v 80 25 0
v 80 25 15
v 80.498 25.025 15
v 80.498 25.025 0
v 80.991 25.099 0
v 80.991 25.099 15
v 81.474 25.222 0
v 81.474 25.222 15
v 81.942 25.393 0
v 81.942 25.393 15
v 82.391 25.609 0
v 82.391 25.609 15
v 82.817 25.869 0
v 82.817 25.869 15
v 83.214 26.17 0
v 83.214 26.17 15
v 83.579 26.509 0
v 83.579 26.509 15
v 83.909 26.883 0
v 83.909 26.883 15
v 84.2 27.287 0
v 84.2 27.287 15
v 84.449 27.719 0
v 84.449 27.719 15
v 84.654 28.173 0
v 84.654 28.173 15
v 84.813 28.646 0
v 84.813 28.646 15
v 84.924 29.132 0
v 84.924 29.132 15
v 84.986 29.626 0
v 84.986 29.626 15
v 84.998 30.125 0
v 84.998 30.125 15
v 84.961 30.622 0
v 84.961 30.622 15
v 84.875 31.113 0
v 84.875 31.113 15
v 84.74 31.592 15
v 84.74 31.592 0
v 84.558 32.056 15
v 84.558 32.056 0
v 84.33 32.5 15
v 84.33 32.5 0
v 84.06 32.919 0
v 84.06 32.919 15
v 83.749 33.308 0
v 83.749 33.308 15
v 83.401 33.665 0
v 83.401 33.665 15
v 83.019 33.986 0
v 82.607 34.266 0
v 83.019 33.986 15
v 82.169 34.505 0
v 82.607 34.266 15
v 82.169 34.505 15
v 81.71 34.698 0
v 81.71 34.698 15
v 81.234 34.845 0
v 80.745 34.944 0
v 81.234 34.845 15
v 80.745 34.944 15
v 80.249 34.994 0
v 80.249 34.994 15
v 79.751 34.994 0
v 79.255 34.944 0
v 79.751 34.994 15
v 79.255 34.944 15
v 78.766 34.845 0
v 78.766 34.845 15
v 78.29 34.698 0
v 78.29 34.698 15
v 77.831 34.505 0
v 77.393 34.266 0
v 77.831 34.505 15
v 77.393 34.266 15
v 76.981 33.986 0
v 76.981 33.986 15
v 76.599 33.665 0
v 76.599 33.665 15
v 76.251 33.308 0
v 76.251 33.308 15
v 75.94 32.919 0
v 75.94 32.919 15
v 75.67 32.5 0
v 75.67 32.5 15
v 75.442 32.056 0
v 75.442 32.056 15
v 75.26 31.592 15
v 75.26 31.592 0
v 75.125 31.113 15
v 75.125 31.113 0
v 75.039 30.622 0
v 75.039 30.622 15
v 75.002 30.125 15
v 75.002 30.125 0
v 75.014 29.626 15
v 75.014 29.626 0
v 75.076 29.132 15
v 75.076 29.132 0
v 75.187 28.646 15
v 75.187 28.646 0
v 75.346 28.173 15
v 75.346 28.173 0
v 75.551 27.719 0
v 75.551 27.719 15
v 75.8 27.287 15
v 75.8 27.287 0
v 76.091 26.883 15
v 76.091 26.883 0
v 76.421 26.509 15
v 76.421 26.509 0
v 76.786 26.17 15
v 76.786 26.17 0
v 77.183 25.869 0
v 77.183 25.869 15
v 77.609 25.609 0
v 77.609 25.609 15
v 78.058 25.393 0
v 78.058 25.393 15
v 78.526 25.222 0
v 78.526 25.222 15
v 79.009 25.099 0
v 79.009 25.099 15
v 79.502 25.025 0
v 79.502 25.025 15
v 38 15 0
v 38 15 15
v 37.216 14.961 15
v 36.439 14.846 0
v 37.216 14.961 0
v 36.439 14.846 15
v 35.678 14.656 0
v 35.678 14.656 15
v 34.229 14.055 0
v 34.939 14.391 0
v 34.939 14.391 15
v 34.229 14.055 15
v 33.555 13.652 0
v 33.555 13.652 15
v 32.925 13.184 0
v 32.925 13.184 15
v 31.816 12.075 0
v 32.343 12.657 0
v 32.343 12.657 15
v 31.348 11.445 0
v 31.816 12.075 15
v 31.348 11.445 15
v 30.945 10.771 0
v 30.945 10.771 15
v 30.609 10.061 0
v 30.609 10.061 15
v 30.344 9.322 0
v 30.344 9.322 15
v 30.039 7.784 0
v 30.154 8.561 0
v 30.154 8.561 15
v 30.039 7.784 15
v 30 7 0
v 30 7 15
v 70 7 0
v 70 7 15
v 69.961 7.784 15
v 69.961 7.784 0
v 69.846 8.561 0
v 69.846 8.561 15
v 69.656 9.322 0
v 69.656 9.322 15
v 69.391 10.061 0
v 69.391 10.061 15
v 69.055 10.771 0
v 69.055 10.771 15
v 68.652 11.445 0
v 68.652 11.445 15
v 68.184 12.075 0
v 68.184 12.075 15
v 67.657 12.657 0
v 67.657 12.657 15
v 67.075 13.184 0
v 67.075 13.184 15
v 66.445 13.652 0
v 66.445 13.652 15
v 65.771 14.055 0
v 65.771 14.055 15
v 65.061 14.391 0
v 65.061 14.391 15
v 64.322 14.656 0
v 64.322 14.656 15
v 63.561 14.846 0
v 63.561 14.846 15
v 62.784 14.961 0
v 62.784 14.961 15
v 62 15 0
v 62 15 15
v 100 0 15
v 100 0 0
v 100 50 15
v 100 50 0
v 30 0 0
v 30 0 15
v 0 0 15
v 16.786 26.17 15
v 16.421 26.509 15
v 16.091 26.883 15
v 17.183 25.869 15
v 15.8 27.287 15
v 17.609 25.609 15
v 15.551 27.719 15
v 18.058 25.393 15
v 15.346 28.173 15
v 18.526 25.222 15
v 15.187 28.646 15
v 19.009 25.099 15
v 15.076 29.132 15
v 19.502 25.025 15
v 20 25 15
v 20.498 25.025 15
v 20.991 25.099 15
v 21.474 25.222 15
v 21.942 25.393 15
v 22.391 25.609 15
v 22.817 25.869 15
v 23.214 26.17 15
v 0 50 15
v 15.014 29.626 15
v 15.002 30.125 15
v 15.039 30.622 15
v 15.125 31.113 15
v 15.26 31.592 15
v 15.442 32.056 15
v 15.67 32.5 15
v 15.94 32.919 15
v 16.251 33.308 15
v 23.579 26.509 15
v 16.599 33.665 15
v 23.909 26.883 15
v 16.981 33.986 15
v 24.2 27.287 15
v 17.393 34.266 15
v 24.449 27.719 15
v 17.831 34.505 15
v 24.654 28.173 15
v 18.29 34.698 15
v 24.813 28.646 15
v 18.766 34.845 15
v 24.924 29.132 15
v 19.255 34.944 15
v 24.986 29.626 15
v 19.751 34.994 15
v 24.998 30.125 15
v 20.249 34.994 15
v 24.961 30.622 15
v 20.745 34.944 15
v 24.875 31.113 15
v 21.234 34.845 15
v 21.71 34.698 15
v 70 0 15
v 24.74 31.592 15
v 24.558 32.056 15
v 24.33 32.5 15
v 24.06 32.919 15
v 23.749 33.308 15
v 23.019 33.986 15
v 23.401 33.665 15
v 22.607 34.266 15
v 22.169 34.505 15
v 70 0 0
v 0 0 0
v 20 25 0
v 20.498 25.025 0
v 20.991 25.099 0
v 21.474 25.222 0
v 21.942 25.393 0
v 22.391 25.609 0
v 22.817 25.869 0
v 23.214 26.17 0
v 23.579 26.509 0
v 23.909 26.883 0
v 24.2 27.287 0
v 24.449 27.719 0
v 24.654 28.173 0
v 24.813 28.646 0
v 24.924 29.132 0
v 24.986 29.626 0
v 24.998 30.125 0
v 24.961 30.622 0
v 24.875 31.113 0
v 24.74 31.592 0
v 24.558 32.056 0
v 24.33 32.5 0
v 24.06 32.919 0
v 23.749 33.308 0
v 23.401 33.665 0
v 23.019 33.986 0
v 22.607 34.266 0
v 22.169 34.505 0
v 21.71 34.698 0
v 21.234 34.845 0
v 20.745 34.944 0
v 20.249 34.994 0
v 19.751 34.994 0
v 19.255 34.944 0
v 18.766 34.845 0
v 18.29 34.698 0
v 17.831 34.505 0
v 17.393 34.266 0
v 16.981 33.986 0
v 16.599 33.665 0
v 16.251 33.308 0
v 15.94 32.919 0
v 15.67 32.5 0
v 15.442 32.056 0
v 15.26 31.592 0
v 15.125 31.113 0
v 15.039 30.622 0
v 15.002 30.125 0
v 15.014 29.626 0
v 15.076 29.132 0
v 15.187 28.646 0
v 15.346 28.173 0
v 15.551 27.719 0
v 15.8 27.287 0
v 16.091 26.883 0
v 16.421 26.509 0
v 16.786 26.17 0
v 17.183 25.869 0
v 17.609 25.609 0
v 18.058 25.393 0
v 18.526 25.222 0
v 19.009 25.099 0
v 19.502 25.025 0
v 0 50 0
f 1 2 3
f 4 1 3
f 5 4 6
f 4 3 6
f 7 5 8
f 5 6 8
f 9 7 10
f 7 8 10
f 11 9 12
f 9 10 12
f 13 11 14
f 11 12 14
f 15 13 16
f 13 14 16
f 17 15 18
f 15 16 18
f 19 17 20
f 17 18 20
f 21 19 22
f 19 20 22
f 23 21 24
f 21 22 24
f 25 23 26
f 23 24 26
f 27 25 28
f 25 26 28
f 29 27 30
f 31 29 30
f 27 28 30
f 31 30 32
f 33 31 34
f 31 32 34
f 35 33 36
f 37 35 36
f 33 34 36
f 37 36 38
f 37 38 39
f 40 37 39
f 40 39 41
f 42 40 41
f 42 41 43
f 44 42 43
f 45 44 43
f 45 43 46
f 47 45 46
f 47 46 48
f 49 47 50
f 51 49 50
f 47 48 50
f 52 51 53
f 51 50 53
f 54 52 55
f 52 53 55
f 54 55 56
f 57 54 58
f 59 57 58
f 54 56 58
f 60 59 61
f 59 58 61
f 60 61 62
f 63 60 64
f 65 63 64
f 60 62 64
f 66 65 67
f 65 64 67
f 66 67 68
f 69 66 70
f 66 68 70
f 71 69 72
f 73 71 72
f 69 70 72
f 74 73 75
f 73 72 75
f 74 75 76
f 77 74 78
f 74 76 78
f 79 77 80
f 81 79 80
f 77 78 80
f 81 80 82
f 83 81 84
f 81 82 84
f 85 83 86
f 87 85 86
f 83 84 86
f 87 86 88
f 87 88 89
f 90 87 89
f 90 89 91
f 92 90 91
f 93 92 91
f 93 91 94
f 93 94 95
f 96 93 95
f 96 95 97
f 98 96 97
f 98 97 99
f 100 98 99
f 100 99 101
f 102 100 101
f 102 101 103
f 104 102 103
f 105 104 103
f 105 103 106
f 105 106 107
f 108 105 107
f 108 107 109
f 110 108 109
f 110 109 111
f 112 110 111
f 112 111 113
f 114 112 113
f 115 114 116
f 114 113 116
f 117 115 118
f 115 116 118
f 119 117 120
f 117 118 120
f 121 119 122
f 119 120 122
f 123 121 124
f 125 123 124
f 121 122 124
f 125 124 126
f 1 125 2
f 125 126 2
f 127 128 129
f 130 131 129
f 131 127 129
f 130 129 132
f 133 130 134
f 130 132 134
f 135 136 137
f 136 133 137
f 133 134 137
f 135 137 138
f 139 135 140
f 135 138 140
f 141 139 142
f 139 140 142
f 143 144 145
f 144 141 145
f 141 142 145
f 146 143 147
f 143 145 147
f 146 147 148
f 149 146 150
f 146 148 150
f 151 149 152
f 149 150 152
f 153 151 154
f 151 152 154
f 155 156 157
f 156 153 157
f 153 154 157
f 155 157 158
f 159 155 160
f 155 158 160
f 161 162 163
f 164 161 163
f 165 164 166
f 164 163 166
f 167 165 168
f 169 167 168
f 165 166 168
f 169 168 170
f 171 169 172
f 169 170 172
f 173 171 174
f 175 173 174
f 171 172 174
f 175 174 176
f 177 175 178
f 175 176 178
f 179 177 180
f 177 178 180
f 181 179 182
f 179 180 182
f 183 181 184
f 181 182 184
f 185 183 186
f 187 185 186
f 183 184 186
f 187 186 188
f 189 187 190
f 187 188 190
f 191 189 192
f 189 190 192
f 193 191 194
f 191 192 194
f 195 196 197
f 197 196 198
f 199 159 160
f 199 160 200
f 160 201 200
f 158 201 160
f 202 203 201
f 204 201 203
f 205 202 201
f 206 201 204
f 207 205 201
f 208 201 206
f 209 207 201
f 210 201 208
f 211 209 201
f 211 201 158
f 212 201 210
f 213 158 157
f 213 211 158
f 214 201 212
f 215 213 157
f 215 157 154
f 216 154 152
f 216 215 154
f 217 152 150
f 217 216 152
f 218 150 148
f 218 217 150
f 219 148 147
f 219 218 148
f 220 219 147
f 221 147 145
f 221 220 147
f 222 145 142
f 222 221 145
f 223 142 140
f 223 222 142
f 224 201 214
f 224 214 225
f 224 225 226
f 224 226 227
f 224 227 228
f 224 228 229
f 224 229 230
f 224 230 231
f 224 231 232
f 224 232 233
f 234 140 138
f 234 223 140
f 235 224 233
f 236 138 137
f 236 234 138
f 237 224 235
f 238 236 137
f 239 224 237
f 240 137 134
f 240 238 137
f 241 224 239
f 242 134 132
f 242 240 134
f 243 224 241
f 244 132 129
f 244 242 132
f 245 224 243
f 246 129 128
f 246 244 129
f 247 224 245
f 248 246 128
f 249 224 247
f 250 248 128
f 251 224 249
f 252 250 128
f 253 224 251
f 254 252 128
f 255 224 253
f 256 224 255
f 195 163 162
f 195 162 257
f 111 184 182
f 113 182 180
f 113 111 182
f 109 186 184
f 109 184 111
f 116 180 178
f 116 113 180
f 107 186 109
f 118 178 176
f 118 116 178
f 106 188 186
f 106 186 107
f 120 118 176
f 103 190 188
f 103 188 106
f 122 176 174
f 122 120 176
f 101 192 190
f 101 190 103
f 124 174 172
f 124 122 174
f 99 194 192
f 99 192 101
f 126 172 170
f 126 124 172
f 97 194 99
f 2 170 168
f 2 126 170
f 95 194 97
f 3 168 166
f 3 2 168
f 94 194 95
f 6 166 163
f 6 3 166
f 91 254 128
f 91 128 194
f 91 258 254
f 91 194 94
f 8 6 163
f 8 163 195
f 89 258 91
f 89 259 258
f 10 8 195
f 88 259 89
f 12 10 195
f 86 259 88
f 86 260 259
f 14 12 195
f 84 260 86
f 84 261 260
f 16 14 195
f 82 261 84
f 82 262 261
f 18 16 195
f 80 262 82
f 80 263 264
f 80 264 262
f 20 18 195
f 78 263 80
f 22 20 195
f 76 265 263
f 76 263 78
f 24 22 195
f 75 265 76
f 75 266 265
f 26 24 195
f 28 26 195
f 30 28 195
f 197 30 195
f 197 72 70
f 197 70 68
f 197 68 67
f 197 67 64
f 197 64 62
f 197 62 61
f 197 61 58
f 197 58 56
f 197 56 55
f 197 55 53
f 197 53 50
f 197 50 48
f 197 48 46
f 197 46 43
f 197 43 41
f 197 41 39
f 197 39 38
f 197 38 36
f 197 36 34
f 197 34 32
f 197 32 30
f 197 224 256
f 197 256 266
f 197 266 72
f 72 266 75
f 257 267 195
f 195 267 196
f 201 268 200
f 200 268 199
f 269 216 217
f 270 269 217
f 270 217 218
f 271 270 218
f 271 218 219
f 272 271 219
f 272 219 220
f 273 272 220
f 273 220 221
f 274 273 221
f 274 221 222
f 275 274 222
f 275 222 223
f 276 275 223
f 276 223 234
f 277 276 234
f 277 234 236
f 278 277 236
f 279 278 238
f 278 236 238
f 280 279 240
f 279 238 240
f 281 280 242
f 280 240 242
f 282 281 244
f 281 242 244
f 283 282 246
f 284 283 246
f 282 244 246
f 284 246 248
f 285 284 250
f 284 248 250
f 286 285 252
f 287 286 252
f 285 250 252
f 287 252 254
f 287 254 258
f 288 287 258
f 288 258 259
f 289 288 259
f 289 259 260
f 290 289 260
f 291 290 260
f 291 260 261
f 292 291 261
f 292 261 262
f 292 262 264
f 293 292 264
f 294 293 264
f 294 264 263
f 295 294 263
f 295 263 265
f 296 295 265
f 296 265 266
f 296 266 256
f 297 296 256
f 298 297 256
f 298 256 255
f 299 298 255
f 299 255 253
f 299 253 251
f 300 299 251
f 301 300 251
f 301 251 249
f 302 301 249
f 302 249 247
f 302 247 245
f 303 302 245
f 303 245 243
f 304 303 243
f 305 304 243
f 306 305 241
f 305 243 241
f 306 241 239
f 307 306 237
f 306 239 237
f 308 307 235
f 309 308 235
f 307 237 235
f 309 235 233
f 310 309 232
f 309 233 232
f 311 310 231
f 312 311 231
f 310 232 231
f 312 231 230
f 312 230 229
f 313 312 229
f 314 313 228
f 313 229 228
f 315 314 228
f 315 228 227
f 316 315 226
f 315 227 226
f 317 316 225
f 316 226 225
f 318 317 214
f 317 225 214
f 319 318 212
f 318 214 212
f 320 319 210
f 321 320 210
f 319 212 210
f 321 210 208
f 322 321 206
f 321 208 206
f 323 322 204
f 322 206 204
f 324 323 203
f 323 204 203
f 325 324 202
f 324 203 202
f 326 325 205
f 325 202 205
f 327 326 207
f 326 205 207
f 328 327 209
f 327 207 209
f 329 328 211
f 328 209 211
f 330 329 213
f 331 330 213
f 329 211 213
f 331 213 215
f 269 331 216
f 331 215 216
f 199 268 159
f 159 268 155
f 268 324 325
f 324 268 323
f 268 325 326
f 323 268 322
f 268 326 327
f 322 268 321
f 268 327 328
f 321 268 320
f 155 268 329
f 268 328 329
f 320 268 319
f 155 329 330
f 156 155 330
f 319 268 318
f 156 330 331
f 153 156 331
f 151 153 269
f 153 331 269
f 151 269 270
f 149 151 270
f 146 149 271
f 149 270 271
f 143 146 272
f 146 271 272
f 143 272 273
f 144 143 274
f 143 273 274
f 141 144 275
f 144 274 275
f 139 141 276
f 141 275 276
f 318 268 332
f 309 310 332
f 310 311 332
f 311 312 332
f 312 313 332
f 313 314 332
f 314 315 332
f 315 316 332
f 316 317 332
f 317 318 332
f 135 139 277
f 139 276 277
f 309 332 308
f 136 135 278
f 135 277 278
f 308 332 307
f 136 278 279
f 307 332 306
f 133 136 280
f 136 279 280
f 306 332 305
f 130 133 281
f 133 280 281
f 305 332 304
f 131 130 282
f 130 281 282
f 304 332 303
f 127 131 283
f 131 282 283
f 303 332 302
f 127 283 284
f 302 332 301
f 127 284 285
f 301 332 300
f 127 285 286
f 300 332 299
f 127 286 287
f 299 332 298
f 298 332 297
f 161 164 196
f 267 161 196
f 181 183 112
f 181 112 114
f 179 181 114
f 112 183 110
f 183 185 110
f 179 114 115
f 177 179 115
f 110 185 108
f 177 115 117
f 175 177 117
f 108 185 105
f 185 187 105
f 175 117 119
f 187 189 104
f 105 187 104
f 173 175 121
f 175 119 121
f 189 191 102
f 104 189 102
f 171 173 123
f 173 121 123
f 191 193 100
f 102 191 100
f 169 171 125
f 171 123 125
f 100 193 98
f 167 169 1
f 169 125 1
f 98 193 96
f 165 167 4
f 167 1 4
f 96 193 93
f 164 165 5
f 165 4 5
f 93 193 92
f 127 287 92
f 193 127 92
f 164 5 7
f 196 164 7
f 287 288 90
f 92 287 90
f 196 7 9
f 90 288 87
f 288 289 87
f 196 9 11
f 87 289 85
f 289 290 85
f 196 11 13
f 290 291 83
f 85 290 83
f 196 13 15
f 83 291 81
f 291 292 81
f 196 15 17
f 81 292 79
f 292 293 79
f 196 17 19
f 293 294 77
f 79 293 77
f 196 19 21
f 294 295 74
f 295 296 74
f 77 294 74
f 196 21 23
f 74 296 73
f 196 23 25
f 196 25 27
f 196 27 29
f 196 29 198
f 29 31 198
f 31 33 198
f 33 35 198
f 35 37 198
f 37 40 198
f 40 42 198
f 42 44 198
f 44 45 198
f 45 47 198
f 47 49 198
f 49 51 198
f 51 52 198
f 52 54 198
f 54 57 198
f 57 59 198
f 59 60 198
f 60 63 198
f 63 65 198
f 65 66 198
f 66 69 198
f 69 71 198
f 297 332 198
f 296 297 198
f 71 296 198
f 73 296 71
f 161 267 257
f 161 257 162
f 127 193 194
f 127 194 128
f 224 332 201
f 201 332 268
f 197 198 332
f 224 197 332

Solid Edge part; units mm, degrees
sketch "Sketch1" plane through (0, 0, 0) normal (0, 0, 1) x (1, 0, 0)
  line L0 (0, 0) -> (100, 0)
  line L1 (100, 0) -> (100, 50)
  line L2 (100, 50) -> (0, 50)
  line L3 (0, 50) -> (0, 0)
extrude "Protrusion1" add sketch "Sketch1" along normal blind 15
hole "Hole_1" at (80, 30, 15) direction (0, 0, -1) diameter 10 end through all
hole "Hole1" at (20, 30, 15) direction (0, 0, -1) diameter 10 end through all
sketch "Sketch2" plane through (50, 25, 0) normal (0, 0, -1) x (-1, 0, 0)
  line L0 (-20, -25) -> (-20, -10)
  line L1 (-20, -10) -> (20, -10)
  line L2 (20, -10) -> (20, -25)
  line L3 (-20, -25) -> (20, -25)
  dimension "D1" = 30
  dimension "D2" = 30
  dimension "D3" = 15
extrude "Cutout1" cut sketch "Sketch2" against normal through all
fillet "Round_1" radius 8 2 edges at (70, 15, 7.5) (30, 15, 7.5)
properties part number "1001"
